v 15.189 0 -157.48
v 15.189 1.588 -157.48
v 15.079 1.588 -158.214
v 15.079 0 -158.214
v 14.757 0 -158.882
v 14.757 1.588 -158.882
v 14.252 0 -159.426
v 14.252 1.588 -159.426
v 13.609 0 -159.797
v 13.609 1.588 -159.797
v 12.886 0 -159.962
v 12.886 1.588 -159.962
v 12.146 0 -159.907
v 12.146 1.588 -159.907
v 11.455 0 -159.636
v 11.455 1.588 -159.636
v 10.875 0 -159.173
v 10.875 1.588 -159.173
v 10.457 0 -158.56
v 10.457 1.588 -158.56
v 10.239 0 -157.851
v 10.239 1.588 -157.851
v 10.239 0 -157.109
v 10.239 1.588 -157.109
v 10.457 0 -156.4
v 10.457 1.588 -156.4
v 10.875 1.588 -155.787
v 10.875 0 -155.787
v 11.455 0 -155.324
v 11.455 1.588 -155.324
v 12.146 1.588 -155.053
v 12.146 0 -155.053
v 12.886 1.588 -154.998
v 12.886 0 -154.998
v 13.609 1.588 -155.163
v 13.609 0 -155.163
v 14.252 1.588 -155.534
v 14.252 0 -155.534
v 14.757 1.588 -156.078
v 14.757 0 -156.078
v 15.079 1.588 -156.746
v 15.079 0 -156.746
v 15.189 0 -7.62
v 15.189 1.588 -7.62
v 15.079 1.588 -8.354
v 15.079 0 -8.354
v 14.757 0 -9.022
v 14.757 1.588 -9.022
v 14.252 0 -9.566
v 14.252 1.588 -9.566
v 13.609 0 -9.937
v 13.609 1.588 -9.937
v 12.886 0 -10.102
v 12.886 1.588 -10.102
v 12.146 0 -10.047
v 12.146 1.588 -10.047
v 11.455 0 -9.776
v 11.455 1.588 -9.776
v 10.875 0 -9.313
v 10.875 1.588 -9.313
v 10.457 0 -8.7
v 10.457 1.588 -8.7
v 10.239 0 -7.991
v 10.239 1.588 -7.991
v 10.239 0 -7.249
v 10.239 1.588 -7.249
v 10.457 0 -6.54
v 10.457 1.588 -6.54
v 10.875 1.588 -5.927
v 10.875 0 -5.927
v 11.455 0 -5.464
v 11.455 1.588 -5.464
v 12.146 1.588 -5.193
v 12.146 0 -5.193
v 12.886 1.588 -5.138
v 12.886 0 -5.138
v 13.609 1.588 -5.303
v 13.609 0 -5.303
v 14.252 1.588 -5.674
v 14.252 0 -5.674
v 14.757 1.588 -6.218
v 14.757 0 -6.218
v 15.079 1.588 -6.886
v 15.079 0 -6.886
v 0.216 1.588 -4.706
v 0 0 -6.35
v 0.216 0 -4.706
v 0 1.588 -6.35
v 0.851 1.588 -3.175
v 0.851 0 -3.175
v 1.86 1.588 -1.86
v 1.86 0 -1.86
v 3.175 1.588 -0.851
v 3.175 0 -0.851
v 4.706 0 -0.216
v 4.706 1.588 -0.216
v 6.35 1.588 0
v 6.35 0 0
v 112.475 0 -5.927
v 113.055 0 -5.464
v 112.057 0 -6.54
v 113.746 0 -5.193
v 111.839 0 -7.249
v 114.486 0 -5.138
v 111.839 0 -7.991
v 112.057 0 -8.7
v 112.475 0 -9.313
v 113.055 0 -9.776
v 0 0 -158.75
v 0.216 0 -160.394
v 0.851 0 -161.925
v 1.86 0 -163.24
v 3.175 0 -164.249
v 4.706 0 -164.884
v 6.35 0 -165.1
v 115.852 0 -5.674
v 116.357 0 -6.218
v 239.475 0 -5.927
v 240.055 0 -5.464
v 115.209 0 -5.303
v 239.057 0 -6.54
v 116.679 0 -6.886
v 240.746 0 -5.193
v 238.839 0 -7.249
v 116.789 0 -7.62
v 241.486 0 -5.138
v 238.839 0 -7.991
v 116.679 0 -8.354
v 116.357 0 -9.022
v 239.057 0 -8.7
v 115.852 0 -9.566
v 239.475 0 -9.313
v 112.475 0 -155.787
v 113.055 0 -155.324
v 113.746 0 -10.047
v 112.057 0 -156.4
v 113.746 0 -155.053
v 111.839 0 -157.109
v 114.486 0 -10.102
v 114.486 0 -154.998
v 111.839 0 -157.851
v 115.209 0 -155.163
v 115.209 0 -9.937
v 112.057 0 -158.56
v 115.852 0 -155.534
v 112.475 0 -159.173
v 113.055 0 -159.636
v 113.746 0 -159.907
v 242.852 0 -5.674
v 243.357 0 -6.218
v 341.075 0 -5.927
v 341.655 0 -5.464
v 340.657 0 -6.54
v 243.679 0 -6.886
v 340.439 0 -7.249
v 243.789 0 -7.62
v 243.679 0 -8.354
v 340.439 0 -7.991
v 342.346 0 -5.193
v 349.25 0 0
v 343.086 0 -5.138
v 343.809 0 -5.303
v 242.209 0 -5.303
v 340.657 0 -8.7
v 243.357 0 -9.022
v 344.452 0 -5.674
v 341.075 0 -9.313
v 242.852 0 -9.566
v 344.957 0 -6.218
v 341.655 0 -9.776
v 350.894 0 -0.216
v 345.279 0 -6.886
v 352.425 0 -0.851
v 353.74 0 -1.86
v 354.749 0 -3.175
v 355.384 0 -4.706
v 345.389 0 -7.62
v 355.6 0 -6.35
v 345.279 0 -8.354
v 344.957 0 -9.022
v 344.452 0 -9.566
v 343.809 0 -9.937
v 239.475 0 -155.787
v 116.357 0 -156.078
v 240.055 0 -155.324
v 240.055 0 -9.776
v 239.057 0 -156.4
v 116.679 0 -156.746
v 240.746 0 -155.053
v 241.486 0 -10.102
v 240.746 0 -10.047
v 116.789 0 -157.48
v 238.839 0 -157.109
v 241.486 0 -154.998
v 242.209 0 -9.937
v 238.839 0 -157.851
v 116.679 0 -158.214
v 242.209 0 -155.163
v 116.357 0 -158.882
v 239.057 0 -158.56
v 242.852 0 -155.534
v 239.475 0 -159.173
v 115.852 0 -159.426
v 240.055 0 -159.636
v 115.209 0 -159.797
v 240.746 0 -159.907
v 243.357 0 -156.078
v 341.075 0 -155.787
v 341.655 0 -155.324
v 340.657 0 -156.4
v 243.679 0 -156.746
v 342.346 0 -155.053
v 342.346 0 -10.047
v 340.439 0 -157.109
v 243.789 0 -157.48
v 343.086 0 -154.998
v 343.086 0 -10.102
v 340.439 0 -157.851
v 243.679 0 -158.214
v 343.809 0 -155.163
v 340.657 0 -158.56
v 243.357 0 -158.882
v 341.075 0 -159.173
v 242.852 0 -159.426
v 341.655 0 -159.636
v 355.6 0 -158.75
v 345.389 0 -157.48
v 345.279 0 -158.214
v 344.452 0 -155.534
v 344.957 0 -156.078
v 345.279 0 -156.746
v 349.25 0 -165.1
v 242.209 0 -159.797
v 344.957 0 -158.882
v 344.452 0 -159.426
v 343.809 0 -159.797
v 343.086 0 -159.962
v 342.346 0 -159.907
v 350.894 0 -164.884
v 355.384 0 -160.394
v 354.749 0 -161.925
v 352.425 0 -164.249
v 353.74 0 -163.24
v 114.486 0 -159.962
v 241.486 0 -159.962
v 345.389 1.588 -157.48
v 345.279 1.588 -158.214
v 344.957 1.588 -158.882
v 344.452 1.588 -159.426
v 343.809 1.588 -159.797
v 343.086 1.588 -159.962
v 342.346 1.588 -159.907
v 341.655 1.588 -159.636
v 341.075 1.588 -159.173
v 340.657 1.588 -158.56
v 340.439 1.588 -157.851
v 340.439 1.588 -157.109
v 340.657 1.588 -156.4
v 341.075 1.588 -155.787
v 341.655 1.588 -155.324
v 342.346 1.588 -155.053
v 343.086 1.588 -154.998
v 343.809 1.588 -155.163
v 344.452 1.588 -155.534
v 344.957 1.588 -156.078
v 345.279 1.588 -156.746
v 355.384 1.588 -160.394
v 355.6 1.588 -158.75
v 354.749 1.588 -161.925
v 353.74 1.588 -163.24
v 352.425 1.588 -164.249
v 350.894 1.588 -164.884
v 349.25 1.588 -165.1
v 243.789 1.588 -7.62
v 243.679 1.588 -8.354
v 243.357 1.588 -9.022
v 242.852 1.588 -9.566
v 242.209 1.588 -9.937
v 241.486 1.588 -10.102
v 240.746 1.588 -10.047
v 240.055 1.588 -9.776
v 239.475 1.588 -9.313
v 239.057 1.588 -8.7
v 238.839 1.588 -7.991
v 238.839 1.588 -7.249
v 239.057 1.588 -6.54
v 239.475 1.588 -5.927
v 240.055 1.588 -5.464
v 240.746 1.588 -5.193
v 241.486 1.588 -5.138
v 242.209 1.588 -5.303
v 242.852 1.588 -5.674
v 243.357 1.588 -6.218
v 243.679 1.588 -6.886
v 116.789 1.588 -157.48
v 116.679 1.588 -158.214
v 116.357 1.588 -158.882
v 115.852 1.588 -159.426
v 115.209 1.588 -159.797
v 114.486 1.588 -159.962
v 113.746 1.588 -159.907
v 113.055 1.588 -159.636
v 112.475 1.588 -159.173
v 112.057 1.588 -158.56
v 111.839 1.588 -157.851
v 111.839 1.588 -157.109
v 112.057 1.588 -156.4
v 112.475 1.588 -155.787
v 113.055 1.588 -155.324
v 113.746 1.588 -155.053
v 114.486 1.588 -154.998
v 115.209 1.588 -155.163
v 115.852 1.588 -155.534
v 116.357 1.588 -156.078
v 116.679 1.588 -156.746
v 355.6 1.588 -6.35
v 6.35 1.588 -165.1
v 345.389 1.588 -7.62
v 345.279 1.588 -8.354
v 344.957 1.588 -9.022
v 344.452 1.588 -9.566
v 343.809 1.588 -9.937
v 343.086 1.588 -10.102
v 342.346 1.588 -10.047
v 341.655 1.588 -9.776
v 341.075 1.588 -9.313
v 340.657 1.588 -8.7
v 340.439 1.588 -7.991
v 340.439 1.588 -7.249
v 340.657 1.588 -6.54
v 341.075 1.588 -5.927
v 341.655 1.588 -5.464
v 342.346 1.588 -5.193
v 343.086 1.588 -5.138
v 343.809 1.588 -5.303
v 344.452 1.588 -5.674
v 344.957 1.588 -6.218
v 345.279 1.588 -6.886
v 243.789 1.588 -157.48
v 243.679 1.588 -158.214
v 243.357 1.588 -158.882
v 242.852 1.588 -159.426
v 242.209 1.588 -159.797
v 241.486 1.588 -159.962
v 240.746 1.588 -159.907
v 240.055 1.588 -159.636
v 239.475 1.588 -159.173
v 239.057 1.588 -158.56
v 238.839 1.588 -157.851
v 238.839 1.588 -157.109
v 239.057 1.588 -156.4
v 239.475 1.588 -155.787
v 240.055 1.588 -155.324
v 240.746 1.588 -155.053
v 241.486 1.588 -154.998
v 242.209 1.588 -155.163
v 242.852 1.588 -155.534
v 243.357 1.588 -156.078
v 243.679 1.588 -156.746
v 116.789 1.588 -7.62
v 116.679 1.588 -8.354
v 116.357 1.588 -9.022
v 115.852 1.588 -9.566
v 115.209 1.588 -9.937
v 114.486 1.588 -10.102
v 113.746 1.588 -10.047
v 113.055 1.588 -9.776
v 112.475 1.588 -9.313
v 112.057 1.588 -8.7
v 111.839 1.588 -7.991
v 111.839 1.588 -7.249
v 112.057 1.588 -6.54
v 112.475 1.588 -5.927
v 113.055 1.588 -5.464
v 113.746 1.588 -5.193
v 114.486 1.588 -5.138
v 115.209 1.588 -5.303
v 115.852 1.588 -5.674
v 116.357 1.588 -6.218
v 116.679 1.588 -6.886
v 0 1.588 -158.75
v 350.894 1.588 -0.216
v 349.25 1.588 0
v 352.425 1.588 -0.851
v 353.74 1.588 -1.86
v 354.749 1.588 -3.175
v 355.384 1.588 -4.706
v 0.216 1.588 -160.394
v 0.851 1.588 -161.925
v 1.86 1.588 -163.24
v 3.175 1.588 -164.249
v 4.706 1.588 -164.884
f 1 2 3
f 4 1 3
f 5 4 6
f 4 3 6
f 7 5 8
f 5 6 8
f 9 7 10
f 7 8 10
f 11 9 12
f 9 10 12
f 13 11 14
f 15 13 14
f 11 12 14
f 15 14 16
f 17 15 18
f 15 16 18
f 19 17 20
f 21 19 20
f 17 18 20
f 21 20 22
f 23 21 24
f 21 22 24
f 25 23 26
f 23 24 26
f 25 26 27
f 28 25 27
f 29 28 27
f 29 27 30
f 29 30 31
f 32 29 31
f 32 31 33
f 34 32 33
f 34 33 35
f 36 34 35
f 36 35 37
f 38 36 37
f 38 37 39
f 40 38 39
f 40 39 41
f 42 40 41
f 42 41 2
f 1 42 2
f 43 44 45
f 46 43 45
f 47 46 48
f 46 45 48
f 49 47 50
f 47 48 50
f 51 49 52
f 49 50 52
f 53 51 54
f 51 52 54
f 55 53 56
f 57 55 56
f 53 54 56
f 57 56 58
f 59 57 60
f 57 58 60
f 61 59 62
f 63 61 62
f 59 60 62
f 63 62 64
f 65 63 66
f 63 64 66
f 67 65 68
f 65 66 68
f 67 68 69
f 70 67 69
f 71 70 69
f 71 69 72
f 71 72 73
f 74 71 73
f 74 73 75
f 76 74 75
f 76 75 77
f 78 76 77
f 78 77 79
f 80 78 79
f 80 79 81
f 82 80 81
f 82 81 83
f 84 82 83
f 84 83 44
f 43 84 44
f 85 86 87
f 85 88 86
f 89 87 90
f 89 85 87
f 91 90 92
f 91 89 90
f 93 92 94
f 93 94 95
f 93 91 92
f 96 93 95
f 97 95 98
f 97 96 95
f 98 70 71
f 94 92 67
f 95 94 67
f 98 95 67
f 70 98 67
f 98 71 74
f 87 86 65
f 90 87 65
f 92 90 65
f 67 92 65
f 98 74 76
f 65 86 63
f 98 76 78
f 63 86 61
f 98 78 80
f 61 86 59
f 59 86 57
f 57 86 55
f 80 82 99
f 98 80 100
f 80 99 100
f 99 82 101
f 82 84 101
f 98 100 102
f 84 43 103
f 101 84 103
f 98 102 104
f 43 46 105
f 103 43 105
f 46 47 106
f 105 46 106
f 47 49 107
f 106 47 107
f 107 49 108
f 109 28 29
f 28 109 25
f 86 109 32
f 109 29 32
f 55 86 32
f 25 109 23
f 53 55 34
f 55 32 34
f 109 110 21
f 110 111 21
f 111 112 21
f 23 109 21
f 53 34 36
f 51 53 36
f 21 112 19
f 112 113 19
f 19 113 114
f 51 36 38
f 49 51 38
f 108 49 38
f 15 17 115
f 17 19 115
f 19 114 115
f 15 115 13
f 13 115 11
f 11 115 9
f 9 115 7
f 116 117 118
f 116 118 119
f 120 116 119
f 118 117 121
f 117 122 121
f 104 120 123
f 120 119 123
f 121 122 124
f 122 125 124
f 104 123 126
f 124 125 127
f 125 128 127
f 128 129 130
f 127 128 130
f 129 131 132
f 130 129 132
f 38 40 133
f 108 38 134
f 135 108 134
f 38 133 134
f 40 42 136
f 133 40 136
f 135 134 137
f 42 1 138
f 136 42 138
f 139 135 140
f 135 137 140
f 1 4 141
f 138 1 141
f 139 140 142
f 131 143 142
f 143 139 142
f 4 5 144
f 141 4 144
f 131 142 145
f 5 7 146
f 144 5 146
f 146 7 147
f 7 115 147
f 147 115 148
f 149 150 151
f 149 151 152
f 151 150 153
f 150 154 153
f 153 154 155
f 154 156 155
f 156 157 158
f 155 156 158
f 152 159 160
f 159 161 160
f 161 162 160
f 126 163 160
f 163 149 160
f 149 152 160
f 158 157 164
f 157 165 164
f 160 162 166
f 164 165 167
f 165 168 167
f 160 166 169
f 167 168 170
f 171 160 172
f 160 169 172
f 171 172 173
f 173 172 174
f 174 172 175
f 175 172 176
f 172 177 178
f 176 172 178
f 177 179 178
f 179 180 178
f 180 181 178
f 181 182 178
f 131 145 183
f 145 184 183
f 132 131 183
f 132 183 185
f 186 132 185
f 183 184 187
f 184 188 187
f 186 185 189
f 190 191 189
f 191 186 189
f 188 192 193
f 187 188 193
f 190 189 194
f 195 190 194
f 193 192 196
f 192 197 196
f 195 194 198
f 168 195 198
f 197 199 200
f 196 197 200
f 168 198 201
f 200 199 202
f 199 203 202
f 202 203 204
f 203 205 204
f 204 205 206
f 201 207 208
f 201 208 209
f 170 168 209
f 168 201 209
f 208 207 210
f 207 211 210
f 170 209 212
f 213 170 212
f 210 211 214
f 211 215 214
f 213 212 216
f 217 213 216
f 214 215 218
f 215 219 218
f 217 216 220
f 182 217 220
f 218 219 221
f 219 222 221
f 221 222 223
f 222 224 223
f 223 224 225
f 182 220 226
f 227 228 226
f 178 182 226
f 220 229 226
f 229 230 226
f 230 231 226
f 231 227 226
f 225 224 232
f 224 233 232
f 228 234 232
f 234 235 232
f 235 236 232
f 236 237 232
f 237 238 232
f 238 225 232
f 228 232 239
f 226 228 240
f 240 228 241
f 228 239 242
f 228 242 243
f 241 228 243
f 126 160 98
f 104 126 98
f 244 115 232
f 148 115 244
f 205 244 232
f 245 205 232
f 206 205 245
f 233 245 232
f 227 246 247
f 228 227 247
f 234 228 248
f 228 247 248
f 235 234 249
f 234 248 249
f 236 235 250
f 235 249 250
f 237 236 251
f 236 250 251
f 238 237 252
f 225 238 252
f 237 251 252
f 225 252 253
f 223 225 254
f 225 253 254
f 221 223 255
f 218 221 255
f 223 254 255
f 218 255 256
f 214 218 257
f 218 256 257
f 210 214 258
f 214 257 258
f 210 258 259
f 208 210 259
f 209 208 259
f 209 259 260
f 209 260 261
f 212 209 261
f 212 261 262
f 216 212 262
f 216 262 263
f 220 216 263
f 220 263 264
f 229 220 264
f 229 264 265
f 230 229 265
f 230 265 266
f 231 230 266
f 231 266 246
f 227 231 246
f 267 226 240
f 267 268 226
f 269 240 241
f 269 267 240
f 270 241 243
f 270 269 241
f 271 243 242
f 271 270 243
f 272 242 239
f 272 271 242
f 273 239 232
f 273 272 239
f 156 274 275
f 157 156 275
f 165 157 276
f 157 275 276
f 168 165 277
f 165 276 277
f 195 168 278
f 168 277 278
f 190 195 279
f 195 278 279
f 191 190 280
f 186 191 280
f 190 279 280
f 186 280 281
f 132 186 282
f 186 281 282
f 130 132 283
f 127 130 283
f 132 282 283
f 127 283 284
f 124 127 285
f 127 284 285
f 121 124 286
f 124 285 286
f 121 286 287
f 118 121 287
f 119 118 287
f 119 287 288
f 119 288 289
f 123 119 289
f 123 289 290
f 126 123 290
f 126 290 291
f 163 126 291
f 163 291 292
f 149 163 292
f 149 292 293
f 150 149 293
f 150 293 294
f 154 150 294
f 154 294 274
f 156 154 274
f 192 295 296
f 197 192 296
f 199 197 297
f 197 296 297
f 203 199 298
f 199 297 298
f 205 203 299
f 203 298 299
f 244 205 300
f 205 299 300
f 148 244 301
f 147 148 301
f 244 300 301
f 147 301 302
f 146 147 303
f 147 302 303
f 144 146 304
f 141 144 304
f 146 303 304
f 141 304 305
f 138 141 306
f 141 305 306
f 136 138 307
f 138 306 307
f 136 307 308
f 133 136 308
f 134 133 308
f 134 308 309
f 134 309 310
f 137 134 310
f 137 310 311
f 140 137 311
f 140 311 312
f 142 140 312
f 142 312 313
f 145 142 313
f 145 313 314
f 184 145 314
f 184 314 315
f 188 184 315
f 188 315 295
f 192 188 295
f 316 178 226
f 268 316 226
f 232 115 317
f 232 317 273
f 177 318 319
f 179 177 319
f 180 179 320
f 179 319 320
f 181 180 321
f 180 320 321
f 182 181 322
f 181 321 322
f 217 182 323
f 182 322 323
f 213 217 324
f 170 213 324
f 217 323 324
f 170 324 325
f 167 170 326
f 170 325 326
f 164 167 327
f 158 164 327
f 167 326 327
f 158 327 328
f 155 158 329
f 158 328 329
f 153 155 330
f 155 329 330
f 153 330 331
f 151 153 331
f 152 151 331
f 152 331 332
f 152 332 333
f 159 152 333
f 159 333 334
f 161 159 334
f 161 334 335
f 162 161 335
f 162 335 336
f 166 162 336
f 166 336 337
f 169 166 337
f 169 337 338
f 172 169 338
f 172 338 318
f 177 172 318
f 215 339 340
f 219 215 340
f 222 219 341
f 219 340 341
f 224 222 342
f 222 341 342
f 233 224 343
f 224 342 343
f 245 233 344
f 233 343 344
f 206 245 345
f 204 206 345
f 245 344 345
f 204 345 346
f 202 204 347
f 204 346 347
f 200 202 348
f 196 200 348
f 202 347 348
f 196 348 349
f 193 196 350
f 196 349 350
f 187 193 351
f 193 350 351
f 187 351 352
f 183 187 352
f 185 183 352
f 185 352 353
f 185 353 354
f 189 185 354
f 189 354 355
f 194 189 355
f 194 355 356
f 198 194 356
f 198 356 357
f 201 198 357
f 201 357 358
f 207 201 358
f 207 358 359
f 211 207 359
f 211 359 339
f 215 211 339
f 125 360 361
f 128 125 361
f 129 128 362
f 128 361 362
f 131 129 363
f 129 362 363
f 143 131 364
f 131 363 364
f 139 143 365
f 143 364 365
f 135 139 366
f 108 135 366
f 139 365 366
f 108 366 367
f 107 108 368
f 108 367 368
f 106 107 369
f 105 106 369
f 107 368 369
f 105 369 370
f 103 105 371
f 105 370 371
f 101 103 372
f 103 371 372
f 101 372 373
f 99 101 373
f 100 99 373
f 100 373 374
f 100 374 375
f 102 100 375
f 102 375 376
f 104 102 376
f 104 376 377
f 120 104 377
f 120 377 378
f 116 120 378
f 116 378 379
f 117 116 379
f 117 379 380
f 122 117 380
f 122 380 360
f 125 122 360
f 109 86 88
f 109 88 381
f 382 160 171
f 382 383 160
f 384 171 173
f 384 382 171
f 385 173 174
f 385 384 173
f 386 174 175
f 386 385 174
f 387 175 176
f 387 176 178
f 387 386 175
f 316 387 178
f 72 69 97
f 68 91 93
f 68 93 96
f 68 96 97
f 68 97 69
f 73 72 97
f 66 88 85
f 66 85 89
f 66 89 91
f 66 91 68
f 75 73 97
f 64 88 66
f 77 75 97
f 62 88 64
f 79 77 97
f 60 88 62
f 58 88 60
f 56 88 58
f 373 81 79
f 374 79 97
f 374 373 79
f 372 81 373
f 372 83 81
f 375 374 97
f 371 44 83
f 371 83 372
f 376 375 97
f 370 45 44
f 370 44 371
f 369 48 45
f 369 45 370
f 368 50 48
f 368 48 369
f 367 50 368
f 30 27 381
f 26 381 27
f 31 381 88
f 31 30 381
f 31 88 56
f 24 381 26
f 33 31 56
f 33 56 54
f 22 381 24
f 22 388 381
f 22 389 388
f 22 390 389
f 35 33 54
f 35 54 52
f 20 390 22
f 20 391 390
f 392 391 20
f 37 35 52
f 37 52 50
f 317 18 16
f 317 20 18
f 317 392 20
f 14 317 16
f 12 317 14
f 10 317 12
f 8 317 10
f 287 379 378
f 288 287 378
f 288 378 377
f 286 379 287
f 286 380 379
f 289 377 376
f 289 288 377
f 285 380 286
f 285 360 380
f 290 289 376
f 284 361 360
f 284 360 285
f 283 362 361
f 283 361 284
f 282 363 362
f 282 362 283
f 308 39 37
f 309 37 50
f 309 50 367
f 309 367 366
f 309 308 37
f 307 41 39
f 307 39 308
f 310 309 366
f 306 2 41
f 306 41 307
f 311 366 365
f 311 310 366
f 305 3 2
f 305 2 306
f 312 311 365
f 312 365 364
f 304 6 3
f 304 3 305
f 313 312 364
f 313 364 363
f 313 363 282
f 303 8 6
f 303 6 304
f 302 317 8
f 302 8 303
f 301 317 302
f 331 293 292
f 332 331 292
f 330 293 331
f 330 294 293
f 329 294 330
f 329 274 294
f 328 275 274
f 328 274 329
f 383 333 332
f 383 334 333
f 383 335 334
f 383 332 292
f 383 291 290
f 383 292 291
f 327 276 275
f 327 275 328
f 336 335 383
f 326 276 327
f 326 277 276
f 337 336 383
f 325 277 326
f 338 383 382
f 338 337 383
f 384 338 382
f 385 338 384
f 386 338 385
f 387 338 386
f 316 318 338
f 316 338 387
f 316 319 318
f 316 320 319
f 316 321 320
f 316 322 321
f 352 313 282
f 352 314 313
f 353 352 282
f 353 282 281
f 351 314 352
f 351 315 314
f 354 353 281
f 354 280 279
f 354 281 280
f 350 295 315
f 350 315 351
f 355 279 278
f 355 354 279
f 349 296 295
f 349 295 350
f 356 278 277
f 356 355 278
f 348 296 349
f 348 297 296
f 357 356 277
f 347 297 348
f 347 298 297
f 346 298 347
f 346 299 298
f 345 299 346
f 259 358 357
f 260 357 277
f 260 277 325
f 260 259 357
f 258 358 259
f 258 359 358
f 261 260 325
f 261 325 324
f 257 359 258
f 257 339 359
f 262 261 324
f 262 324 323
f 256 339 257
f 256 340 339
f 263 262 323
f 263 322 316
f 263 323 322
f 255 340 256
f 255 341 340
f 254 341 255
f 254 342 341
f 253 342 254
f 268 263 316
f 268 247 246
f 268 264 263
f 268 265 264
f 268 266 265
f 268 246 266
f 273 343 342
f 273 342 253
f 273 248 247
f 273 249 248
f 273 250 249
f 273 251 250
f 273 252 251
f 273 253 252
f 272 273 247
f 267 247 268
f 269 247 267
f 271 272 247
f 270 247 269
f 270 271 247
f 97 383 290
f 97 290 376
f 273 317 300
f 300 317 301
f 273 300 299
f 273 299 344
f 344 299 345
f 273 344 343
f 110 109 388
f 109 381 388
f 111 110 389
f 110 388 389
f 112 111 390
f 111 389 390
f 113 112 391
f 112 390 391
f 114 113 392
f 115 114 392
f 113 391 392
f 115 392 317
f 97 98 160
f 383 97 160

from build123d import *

# Parameters (mm, degrees)
SKETCH1_W           = 355.6
SKETCH1_H           = 165.1
BOSS_EXTRUDE1_DEPTH = 1.5875
FILLET1_R           = 6.35
SKETCH2_R           = 2.4892
CUT_EXTRUDE1_DEPTH  = 2.5875


with BuildPart() as part:
    # Sketch1 → Boss-Extrude1 (new body)
    with BuildSketch(Plane(origin=(0, 0, 0), x_dir=(1, 0, 0), z_dir=(0, 1, 0))):
        with Locations((177.8, 82.55)):
            Rectangle(SKETCH1_W, SKETCH1_H)
    extrude(amount=BOSS_EXTRUDE1_DEPTH)

    # Fillet1
    fillet1_edges = [part.edges().sort_by_distance(p)[0] for p in [
        (0, 0.79375, -165.1),
        (355.6, 0.79375, -165.1),
        (355.6, 0.79375, 0),
        (0, 0.79375, 0),
    ]]
    fillet(fillet1_edges, radius=FILLET1_R)

    # Sketch2 → Cut-Extrude1 (cut, through all)
    with BuildSketch(Plane(origin=(0, 1.5875, 0), x_dir=(1, 0, 0), z_dir=(0, 1, 0))):
        with Locations((12.7, 7.62)):
            Circle(SKETCH2_R)
        with Locations((342.9, 7.62)):
            Circle(SKETCH2_R)
        with Locations((241.3, 7.62)):
            Circle(SKETCH2_R)
        with Locations((114.3, 7.62)):
            Circle(SKETCH2_R)
        with Locations((114.3, 157.48)):
            Circle(SKETCH2_R)
        with Locations((342.9, 157.48)):
            Circle(SKETCH2_R)
        with Locations((12.7, 157.48)):
            Circle(SKETCH2_R)
        with Locations((241.3, 157.48)):
            Circle(SKETCH2_R)
    extrude(amount=-CUT_EXTRUDE1_DEPTH, mode=Mode.SUBTRACT)


solid = part.part
